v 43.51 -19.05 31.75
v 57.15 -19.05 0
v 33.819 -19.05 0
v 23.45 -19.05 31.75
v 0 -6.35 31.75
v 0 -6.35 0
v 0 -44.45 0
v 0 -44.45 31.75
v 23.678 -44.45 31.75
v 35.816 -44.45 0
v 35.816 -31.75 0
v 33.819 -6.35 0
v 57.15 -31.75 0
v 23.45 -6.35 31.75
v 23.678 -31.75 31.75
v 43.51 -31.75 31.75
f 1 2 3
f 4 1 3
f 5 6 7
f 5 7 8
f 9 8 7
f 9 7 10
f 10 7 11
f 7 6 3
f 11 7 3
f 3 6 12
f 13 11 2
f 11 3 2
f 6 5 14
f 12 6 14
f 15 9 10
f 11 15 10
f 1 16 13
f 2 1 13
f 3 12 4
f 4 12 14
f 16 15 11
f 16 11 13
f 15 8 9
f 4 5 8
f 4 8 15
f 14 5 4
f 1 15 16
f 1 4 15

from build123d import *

# Parameters (mm, degrees)
F0_W      = 57.15
F0_H      = 31.75
F1_DEPTH  = 38.1
F2_DEPTH  = 12.7
F4_DEPTH  = 12.7
F6_DEPTH  = 12.7
F8_DEPTH  = 38.101
F9_DEPTH  = 6.35
F10_DEPTH = 6.35
F11_DEPTH = 6.35
F12_DEPTH = 6.35


with BuildPart() as f1:
    # F0 (on Front) → F1 (new body)
    with BuildSketch(Plane.XZ):
        with Locations((28.575, 15.875)):
            Rectangle(F0_W, F0_H)
    extrude(amount=F1_DEPTH)

    # F2 (add): a face of the model
    f2_faces = [f1.faces().sort_by_distance(p)[0] for p in [
        (28.575, -38.1, 15.875),
    ]]
    extrude(f2_faces, amount=F2_DEPTH)

    # F3 (on face) → F4 (cut)
    with BuildSketch(Plane.XZ.offset(50.8)):
        Polygon((57.15, 31.75), (23.6781723797, 31.75), (35.8164422214, 0), (57.15, 0), align=None)
    extrude(amount=-F4_DEPTH, mode=Mode.SUBTRACT)

    # F5 (on face) → F6 (cut)
    with BuildSketch(Plane(origin=(0, 0, 0), x_dir=(-1, 0, 0), z_dir=(0, 1, 0))):
        Polygon((-33.819206059, 0), (-23.4500579536, 31.75), (-57.15, 31.75), (-57.15, 0), align=None)
    extrude(amount=-F6_DEPTH, mode=Mode.SUBTRACT)

    # F7 (on face) → F8 (cut, through all)
    with BuildSketch(Plane.XZ.offset(38.1)):
        Polygon((57.15, 31.75), (43.5097105801, 31.75), (57.15, 0), align=None)
    extrude(amount=-F8_DEPTH, mode=Mode.SUBTRACT)

    # F9 (cut): a face of the model
    f9_faces = [f1.faces().sort_by_distance(p)[0] for p in [
        (40.1169646518, -38.1, 15.6819192663),
    ]]
    extrude(f9_faces, amount=-F9_DEPTH, mode=Mode.SUBTRACT)

    # F10 (cut): a face of the model
    f10_faces = [f1.faces().sort_by_distance(p)[0] for p in [
        (39.6330799675, -12.7, 15.4760691102),
    ]]
    extrude(f10_faces, amount=-F10_DEPTH, mode=Mode.SUBTRACT)

    # F11 (cut): a face of the model
    f11_faces = [f1.faces().sort_by_distance(p)[0] for p in [
        (14.4737687914, 0, 14.9168931282),
    ]]
    extrude(f11_faces, amount=-F11_DEPTH, mode=Mode.SUBTRACT)

    # F12 (cut): a face of the model
    f12_faces = [f1.faces().sort_by_distance(p)[0] for p in [
        (15.0800275041, -50.8, 14.7953782839),
    ]]
    extrude(f12_faces, amount=-F12_DEPTH, mode=Mode.SUBTRACT)


solid = f1.part
